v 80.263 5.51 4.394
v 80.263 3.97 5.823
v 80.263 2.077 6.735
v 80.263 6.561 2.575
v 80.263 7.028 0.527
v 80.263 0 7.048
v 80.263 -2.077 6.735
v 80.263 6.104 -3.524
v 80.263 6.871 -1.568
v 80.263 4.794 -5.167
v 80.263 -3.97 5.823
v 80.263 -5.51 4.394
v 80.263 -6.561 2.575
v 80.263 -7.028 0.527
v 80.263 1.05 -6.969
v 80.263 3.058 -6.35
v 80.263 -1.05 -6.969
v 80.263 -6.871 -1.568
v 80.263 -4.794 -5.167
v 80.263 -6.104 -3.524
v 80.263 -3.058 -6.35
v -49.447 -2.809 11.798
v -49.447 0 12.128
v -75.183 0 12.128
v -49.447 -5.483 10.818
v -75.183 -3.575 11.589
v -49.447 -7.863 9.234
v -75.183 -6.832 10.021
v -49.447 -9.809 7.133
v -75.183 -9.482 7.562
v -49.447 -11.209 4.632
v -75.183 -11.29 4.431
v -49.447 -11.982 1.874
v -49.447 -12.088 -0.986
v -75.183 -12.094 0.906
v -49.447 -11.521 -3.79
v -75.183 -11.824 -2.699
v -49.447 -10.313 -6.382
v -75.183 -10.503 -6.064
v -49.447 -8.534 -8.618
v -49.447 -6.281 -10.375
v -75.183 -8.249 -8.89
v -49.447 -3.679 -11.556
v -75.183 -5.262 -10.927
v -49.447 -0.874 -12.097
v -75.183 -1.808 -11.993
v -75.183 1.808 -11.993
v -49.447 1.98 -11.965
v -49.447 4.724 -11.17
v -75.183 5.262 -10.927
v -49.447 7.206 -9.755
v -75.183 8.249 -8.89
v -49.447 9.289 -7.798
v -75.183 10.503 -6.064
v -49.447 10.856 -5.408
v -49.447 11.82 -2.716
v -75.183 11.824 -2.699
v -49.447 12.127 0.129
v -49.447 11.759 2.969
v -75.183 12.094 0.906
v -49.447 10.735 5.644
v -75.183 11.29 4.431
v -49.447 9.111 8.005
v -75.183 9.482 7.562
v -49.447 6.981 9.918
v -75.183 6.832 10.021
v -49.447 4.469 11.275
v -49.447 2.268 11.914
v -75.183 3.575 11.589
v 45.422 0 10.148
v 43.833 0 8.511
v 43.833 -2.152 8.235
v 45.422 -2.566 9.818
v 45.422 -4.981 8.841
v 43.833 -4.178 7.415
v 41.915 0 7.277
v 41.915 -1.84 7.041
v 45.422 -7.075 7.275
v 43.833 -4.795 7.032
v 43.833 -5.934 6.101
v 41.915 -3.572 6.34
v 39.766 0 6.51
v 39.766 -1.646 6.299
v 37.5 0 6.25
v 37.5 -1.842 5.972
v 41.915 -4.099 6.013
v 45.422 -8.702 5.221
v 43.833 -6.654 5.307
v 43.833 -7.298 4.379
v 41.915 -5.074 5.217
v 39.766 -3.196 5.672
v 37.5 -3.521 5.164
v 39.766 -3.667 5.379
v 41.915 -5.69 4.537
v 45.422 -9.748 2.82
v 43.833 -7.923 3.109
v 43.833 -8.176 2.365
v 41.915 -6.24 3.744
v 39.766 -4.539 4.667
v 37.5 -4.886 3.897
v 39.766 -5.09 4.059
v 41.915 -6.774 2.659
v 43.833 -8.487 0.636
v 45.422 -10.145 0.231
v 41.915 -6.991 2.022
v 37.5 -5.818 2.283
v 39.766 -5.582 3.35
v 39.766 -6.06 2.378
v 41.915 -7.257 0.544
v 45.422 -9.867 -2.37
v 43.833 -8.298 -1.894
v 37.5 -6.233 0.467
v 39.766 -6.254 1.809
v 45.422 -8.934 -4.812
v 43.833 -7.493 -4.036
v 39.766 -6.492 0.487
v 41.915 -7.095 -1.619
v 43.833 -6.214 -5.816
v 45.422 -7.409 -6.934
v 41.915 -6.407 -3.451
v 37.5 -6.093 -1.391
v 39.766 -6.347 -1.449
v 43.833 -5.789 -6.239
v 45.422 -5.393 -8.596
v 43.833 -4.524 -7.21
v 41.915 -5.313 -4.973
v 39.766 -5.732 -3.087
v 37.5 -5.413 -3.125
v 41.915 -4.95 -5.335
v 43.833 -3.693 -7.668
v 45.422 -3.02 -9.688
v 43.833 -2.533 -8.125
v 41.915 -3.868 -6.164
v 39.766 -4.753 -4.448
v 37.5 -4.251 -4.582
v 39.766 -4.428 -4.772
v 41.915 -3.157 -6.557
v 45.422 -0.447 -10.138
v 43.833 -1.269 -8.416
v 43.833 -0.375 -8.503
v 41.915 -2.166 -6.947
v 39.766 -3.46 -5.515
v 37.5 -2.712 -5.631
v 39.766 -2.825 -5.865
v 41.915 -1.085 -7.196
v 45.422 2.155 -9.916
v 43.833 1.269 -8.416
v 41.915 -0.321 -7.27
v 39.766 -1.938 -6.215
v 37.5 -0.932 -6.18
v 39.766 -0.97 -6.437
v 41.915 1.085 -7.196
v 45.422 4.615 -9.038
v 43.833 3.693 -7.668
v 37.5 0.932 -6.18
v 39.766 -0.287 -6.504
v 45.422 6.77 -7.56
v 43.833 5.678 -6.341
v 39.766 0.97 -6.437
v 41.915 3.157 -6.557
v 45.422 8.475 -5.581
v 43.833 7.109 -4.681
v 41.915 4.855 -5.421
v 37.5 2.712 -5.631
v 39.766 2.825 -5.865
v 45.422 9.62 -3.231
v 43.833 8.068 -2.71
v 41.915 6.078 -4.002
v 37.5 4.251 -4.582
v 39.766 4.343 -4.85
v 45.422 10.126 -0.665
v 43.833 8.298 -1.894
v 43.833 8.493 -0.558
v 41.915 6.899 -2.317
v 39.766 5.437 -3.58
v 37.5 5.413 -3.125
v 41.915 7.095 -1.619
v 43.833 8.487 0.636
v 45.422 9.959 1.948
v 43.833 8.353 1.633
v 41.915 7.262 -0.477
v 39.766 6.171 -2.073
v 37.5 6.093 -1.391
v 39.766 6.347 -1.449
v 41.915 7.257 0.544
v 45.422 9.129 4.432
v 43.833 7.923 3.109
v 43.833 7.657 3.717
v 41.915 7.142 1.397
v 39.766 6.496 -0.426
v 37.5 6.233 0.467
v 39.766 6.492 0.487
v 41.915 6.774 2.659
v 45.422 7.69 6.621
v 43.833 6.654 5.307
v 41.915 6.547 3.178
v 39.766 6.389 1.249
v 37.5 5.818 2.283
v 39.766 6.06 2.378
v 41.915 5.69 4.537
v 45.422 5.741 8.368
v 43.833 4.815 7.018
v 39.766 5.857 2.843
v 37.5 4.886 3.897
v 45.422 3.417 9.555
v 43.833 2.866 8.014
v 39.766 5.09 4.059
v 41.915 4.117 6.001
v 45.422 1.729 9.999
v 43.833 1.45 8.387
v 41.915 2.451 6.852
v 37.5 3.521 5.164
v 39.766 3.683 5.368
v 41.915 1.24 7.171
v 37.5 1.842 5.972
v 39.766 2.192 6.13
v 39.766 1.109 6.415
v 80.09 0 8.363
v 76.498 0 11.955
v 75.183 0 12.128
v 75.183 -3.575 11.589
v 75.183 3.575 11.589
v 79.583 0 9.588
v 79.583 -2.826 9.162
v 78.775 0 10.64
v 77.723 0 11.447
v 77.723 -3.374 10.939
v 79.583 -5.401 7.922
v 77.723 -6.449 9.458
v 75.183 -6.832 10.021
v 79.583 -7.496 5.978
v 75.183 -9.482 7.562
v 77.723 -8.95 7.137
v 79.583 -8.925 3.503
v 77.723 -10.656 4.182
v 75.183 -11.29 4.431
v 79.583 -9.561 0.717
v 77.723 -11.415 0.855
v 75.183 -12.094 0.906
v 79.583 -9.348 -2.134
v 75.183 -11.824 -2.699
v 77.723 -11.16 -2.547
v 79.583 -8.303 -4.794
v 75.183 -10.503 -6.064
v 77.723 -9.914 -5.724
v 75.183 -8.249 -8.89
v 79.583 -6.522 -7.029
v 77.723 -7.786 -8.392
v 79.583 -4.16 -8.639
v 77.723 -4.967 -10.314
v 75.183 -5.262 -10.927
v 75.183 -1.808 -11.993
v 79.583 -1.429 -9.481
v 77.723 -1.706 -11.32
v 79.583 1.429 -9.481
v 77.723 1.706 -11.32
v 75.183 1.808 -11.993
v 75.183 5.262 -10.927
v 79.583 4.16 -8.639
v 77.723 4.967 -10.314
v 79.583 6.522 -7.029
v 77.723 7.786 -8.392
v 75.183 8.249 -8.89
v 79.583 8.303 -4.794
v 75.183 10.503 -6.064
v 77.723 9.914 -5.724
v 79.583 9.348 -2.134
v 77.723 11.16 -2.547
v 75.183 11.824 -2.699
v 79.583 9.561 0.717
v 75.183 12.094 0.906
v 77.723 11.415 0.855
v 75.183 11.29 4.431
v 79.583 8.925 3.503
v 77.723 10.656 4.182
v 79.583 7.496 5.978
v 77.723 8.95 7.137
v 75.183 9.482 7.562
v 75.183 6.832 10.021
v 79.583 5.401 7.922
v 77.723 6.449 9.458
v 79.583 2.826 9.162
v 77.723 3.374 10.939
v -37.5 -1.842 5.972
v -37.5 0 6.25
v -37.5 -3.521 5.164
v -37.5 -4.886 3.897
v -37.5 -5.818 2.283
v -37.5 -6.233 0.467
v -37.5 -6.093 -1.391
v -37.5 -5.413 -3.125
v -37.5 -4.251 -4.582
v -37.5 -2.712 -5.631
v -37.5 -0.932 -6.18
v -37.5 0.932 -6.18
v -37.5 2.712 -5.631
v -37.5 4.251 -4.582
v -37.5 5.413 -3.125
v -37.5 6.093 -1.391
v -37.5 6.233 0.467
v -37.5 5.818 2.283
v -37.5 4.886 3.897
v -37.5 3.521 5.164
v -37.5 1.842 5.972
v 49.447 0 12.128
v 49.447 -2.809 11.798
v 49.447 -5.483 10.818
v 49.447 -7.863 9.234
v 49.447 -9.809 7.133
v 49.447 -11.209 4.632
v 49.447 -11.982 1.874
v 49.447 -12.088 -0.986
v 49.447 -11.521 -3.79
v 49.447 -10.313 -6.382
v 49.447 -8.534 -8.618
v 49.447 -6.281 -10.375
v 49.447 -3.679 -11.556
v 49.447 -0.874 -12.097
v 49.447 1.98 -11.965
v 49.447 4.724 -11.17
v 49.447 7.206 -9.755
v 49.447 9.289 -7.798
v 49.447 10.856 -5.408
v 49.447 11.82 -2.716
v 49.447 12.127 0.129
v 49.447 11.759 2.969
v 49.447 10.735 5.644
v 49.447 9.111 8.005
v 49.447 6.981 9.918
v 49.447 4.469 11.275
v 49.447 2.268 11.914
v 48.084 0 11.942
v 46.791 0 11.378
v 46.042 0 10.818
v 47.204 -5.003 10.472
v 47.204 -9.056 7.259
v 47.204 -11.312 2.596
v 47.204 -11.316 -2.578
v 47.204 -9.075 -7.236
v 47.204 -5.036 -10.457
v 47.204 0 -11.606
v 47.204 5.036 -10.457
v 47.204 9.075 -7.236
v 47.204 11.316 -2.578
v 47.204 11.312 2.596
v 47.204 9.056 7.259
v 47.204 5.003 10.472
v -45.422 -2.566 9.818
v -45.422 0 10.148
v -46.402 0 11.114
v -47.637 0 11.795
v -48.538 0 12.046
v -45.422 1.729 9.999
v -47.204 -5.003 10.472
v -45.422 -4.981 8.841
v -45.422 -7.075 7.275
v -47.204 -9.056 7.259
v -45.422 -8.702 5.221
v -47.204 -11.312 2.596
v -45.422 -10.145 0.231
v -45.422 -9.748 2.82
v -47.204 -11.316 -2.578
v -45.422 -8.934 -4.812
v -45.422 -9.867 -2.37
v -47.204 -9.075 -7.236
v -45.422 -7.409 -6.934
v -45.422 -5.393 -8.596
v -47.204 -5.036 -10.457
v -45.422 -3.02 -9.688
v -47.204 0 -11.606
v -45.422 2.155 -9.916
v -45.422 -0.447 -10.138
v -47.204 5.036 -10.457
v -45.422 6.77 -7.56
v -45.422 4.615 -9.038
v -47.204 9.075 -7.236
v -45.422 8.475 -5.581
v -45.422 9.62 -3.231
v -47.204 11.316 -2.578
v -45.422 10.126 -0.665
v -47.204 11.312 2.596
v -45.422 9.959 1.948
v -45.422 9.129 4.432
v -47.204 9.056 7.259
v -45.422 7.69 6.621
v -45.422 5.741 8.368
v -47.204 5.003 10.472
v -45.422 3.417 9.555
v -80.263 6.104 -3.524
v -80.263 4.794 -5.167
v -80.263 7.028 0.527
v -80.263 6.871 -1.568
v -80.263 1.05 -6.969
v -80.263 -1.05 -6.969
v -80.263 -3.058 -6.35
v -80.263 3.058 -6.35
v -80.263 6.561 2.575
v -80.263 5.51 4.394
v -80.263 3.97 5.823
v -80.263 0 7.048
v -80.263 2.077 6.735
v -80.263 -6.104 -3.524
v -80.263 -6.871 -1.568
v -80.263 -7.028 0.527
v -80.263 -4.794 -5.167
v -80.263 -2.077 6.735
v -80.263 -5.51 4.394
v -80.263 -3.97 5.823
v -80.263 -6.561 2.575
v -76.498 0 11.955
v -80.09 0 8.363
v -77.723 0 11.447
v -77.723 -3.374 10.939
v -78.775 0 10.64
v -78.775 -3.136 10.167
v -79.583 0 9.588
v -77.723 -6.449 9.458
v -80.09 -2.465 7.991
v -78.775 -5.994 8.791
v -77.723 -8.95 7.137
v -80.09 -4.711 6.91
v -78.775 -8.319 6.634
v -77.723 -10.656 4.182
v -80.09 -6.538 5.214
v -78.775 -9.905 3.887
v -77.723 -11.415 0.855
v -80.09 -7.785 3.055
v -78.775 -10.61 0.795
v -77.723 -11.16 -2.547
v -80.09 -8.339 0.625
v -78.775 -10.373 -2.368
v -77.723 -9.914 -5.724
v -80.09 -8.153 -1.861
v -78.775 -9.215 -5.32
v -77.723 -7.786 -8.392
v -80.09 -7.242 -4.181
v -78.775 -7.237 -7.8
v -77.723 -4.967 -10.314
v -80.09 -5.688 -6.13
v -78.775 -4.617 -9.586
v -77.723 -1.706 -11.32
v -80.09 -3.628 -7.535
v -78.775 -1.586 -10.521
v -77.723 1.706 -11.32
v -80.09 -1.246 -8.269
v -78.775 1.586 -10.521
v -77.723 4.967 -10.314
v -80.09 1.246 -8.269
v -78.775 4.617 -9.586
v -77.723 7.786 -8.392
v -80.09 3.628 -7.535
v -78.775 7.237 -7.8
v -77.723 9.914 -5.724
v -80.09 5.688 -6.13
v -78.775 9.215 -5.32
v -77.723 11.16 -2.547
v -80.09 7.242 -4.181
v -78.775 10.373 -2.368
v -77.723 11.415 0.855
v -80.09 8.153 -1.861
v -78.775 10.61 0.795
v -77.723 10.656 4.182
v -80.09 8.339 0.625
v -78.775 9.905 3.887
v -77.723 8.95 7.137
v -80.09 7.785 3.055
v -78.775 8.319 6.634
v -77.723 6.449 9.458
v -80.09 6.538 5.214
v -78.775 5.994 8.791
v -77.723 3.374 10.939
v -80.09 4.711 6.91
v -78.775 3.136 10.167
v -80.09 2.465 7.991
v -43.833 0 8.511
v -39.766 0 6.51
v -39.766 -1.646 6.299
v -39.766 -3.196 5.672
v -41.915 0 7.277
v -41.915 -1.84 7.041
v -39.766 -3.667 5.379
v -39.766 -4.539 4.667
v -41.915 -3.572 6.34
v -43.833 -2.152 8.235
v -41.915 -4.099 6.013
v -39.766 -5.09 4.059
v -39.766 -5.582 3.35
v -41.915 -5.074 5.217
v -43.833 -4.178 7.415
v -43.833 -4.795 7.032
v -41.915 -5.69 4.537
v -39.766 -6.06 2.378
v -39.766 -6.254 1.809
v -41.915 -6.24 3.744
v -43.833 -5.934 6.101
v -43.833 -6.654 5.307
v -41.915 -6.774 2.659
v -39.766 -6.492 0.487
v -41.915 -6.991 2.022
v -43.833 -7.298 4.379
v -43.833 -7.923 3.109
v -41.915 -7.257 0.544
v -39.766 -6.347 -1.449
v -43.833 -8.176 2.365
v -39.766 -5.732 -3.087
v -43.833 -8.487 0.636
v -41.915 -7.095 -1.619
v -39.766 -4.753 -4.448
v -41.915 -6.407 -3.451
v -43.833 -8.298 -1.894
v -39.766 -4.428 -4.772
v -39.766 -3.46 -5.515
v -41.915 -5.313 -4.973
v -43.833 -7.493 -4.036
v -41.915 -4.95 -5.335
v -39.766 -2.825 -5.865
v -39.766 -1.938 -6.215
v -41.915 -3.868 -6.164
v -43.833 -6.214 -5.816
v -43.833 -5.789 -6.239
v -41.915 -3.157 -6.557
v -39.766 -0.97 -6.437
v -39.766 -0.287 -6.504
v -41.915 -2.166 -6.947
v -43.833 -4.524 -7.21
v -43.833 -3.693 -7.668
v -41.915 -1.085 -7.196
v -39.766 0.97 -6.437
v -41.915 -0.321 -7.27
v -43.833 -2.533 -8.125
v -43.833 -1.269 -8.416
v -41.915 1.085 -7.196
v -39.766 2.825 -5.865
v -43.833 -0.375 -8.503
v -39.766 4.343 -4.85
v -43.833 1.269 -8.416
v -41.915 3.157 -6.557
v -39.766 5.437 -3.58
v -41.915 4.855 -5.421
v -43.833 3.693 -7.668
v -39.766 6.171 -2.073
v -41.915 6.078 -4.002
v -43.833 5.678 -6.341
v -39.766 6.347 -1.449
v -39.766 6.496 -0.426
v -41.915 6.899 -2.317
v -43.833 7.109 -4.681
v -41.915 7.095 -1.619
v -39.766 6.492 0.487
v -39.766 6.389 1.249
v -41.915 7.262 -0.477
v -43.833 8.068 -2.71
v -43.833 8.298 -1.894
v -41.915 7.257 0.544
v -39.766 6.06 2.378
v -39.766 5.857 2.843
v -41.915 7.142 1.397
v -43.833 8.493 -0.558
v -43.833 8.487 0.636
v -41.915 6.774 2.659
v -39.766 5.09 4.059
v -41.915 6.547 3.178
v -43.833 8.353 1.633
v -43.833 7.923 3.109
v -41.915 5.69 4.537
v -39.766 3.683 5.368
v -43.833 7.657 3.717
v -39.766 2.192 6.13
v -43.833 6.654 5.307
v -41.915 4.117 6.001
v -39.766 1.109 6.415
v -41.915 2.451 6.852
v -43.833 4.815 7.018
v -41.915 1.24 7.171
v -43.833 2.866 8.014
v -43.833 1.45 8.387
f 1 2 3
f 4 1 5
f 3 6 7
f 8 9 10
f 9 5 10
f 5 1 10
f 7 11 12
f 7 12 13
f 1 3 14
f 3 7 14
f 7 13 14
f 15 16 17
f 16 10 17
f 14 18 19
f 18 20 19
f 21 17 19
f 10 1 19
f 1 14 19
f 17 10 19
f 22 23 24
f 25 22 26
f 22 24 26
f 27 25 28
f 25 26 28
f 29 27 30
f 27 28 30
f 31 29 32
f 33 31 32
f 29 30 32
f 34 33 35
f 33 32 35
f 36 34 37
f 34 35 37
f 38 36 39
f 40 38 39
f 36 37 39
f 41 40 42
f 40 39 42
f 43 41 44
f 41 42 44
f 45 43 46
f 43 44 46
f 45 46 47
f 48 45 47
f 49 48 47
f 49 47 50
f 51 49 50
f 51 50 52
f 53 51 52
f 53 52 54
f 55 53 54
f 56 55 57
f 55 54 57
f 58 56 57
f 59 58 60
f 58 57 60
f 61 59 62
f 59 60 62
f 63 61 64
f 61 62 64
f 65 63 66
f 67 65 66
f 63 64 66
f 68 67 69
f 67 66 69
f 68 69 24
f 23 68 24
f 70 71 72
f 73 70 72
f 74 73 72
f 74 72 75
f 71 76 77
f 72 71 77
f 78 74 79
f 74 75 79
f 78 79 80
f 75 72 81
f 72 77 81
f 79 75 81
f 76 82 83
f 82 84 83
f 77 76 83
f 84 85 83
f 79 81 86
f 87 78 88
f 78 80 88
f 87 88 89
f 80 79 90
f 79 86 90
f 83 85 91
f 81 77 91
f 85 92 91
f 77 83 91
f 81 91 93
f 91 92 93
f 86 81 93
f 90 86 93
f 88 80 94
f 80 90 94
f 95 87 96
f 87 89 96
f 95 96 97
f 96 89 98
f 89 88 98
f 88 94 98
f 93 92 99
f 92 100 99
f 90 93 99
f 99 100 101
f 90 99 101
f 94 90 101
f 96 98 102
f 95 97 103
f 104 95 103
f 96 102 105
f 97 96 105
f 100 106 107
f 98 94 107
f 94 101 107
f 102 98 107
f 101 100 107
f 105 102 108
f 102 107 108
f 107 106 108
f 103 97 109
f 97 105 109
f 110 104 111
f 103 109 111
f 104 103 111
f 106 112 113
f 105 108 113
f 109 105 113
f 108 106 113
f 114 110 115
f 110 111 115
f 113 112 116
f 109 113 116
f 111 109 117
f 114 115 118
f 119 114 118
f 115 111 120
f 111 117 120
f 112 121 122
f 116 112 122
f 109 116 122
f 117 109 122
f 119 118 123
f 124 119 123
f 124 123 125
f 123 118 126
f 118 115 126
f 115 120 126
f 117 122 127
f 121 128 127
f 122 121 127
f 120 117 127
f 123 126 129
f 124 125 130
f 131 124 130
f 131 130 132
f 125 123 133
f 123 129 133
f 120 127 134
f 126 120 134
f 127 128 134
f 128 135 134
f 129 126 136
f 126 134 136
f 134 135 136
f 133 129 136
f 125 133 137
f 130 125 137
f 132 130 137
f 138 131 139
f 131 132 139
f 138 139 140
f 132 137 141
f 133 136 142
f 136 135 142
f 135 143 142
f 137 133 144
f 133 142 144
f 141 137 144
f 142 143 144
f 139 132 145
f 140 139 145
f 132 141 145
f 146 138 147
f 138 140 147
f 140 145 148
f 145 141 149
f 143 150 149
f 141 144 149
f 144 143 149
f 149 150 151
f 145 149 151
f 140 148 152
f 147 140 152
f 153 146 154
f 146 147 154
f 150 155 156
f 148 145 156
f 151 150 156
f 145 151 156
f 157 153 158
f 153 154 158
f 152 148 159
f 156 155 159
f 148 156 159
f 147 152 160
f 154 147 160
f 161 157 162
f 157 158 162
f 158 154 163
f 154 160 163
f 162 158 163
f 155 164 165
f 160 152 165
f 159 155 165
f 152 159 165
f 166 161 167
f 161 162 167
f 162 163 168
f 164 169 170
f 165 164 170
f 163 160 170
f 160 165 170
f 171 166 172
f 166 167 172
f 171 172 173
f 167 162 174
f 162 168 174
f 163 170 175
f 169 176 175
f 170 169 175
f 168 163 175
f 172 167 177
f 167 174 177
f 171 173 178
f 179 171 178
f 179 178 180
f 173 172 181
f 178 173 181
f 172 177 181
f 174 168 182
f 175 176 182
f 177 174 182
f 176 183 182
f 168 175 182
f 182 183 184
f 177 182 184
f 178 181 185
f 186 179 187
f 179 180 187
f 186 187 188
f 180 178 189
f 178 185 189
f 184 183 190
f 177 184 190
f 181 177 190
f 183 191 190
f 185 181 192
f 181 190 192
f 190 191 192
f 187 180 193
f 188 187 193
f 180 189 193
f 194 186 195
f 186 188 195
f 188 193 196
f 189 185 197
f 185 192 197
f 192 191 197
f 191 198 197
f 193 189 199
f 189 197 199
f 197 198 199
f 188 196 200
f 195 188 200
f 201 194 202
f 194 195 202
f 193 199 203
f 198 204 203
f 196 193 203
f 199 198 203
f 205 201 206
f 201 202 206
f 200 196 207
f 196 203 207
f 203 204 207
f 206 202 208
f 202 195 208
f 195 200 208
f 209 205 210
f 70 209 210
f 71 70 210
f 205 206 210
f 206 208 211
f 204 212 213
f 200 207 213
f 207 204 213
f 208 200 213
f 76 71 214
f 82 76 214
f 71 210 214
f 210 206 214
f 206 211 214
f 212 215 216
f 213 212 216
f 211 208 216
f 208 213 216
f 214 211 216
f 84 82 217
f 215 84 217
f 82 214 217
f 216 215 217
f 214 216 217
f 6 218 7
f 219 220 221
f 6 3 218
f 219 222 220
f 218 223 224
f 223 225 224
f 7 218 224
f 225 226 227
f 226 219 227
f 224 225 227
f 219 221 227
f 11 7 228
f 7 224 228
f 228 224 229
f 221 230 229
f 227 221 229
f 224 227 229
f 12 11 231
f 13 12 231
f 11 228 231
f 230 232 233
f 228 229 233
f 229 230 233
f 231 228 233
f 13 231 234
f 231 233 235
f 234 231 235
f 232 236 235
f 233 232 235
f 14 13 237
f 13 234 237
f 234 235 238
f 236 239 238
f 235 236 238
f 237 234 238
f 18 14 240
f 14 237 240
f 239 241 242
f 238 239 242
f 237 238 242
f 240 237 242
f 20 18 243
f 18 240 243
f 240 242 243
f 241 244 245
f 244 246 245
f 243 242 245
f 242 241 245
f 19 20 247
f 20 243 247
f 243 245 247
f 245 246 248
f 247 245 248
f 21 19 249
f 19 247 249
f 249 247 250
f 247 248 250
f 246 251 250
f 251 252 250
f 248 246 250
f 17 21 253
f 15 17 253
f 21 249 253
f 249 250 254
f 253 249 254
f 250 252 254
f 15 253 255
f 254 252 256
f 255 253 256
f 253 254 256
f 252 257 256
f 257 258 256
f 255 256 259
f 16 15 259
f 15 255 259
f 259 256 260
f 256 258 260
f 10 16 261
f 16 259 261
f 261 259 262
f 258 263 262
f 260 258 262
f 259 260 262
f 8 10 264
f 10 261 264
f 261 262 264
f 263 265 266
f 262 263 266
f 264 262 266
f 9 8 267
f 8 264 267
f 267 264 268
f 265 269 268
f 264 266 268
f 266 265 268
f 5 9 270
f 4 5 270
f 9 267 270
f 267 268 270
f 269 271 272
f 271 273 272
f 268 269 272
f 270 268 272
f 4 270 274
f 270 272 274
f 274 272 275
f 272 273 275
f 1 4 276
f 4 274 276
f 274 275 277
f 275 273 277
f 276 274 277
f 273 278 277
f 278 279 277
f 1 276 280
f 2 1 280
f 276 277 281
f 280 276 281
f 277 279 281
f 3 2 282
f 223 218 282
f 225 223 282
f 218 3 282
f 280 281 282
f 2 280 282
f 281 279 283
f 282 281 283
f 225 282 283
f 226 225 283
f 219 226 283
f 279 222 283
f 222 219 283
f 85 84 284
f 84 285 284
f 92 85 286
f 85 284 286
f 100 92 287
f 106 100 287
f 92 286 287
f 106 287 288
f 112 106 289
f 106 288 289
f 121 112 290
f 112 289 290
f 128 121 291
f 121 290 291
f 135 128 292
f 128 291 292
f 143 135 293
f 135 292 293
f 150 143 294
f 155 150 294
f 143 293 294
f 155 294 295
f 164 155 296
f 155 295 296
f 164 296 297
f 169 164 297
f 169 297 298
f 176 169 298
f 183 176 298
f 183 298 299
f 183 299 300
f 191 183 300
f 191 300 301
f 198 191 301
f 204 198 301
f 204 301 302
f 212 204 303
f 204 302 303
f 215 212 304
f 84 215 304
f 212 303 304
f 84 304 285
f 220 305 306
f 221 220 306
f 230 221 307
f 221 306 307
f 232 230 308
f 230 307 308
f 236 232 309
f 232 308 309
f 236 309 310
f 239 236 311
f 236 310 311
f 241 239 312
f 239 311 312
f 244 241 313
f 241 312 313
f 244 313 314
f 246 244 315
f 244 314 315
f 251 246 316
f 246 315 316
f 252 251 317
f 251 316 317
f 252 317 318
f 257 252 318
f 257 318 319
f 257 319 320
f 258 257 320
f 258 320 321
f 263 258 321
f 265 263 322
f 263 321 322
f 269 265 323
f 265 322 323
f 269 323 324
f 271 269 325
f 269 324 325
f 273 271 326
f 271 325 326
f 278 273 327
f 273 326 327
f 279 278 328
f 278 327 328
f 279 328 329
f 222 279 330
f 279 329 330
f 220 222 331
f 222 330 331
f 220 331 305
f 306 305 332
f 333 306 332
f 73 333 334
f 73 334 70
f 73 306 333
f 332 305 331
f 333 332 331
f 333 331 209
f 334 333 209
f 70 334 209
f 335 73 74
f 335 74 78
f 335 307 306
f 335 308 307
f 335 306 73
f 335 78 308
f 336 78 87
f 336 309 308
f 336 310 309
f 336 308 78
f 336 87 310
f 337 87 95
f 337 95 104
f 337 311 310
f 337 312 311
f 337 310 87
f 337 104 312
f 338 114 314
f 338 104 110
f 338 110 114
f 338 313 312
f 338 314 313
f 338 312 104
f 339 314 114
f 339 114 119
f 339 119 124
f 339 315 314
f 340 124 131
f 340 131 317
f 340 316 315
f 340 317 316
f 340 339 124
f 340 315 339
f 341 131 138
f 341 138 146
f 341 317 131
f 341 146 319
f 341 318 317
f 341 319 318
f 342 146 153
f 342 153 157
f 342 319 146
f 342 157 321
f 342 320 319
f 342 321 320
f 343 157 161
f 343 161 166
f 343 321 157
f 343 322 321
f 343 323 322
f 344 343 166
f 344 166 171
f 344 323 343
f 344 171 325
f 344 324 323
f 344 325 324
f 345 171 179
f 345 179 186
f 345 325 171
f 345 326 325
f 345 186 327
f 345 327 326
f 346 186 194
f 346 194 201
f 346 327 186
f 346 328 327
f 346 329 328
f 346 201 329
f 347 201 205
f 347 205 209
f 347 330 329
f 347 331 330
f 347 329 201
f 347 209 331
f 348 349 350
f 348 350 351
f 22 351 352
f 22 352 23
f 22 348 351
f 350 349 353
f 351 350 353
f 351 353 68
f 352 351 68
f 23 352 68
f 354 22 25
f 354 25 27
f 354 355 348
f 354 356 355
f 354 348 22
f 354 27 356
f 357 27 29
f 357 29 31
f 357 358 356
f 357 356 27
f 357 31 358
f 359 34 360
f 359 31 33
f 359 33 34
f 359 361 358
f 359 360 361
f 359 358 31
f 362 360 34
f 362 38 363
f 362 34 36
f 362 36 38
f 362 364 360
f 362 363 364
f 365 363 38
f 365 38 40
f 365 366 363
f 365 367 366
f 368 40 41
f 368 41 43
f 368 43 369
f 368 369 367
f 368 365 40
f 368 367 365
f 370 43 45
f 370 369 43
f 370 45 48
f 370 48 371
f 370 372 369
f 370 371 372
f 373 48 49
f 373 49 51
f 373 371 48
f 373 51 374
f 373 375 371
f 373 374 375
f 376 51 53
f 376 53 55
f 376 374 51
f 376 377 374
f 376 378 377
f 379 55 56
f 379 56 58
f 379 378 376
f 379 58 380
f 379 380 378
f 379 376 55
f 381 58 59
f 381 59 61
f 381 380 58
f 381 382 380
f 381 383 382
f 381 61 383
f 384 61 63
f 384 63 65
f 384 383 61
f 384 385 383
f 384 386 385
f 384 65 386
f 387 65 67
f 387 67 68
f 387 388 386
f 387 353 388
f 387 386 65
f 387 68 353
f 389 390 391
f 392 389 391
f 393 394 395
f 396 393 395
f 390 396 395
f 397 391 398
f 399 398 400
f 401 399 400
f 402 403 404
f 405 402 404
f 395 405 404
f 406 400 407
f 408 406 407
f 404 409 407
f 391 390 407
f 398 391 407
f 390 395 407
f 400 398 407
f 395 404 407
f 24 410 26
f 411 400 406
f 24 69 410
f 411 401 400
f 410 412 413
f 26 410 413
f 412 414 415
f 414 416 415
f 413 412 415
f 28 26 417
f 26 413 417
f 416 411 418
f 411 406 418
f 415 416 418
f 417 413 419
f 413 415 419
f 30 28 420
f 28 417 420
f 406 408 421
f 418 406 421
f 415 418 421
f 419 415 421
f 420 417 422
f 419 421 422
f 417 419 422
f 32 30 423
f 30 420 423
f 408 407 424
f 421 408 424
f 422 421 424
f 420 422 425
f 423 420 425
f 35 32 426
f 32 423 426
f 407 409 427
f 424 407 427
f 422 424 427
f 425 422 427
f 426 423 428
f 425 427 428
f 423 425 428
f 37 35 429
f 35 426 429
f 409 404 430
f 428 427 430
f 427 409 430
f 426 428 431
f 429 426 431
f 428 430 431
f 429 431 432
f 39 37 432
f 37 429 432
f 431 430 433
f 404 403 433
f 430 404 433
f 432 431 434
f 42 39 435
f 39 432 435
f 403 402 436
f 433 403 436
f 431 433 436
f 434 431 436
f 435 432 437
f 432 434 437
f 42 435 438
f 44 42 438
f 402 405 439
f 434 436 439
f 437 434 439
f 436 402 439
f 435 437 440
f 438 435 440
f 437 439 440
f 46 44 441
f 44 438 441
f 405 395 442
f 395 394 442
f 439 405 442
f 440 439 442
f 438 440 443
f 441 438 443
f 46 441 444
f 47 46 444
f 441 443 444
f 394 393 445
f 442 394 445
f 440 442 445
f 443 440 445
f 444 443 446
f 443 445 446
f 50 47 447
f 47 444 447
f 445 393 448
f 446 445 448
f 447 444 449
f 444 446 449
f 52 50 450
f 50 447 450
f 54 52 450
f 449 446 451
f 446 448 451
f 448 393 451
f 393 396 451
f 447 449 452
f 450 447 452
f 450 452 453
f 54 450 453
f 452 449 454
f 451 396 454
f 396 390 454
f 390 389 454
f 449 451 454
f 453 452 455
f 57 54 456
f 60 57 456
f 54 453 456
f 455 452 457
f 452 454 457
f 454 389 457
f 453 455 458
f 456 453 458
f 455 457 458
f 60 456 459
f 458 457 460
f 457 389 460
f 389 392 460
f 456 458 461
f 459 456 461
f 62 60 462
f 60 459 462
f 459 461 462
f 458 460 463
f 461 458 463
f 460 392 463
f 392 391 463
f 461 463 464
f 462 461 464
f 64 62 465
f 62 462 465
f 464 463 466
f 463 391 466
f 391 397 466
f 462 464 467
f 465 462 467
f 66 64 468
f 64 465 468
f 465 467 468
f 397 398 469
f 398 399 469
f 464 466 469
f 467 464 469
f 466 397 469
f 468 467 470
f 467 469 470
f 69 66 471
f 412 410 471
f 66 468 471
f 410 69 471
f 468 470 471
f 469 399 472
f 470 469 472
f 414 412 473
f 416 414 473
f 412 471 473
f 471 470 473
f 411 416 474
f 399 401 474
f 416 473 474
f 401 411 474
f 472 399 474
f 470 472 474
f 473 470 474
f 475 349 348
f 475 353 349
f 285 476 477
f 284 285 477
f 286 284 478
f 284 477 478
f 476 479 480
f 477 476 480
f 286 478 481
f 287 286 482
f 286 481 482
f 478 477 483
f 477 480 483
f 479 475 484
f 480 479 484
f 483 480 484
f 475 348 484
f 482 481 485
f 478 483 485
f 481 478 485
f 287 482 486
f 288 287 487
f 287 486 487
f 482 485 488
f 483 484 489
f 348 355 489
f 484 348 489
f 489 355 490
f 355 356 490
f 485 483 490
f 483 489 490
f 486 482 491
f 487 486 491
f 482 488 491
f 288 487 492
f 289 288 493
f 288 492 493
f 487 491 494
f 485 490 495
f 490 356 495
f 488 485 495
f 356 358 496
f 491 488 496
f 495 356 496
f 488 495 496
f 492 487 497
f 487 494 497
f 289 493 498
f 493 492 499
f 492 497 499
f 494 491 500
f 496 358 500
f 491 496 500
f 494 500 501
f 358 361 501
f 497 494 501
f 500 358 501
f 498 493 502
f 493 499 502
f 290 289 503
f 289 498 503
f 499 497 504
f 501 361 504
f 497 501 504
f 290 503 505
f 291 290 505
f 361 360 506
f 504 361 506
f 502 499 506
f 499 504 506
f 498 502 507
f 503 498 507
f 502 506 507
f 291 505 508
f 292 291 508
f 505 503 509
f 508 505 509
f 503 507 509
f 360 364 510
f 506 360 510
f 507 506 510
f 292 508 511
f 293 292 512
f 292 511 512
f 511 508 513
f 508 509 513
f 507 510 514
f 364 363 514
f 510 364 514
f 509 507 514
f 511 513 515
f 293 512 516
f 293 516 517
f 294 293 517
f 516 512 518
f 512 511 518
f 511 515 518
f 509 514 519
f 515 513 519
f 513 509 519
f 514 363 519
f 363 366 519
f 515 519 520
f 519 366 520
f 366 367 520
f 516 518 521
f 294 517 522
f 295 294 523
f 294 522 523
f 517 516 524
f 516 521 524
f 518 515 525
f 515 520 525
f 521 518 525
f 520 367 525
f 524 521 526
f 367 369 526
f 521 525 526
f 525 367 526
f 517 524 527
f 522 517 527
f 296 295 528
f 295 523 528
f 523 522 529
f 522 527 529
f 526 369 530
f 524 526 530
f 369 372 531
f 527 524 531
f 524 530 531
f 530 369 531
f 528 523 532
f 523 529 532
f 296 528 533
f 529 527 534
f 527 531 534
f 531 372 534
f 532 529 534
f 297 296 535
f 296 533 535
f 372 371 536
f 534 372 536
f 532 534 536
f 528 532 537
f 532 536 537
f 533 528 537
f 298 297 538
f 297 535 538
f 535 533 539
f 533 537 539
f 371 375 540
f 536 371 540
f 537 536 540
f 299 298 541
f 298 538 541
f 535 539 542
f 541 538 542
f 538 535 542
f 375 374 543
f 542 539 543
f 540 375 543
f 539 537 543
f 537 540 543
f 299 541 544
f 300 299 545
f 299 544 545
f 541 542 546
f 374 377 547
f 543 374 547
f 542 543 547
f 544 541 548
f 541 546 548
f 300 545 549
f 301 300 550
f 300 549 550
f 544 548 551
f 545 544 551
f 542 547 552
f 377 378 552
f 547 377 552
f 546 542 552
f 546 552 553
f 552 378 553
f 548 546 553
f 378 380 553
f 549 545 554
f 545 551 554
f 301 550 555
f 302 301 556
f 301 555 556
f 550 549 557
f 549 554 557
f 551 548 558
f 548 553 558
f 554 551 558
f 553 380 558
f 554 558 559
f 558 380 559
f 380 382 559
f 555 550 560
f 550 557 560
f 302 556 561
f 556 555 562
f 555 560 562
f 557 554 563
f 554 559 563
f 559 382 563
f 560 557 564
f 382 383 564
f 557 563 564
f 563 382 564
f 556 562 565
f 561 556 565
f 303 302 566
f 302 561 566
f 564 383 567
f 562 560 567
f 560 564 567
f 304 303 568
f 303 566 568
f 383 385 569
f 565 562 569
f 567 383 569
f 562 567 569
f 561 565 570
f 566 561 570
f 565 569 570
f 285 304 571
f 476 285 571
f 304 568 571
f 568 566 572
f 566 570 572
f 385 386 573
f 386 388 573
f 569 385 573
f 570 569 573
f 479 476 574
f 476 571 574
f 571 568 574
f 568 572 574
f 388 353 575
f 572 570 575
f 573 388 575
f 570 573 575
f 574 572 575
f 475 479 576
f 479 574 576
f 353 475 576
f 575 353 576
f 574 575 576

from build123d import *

# Parameters (mm, degrees)
F2_R = 5.08


with BuildPart() as f1:
    # F0 (on Front) → F1 (revolve)
    with BuildSketch(Plane.XZ):
        with BuildLine():
            Line((37.5, 6.25), (0, 6.25))
            Line((0, 6.25), (-37.5, 6.25))
            ThreePointArc((-37.5, 6.25), (-42.92127, 7.847034), (-46.610949, 12.128033))
            Line((-46.610949, 12.128033), (-80.26316, 12.128033))
            Line((-80.26316, 12.128033), (-80.26316, 0))
            Line((-80.26316, 0), (80.26316, 0))
            Line((80.26316, 0), (80.26316, 12.128033))
            Line((80.26316, 12.128033), (46.610949, 12.128033))
            ThreePointArc((46.610949, 12.128033), (42.92127, 7.847034), (37.5, 6.25))
        make_face()
    revolve(axis=Axis((0, 0, 0), (1, 0, 0)))

    # F2
    f2_edges = [f1.edges().sort_by_distance(p)[0] for p in [
        (-37.5, 0, -6.25),
        (-46.610949, 0, -12.128033),
        (-42.92127, 0, 7.847034),
        (46.610949, 0, -12.128033),
        (37.5, 0, -6.25),
        (-80.26316, 0, -12.128033),
        (80.26316, 0, -12.128033),
    ]]
    fillet(f2_edges, radius=F2_R)


solid = f1.part
